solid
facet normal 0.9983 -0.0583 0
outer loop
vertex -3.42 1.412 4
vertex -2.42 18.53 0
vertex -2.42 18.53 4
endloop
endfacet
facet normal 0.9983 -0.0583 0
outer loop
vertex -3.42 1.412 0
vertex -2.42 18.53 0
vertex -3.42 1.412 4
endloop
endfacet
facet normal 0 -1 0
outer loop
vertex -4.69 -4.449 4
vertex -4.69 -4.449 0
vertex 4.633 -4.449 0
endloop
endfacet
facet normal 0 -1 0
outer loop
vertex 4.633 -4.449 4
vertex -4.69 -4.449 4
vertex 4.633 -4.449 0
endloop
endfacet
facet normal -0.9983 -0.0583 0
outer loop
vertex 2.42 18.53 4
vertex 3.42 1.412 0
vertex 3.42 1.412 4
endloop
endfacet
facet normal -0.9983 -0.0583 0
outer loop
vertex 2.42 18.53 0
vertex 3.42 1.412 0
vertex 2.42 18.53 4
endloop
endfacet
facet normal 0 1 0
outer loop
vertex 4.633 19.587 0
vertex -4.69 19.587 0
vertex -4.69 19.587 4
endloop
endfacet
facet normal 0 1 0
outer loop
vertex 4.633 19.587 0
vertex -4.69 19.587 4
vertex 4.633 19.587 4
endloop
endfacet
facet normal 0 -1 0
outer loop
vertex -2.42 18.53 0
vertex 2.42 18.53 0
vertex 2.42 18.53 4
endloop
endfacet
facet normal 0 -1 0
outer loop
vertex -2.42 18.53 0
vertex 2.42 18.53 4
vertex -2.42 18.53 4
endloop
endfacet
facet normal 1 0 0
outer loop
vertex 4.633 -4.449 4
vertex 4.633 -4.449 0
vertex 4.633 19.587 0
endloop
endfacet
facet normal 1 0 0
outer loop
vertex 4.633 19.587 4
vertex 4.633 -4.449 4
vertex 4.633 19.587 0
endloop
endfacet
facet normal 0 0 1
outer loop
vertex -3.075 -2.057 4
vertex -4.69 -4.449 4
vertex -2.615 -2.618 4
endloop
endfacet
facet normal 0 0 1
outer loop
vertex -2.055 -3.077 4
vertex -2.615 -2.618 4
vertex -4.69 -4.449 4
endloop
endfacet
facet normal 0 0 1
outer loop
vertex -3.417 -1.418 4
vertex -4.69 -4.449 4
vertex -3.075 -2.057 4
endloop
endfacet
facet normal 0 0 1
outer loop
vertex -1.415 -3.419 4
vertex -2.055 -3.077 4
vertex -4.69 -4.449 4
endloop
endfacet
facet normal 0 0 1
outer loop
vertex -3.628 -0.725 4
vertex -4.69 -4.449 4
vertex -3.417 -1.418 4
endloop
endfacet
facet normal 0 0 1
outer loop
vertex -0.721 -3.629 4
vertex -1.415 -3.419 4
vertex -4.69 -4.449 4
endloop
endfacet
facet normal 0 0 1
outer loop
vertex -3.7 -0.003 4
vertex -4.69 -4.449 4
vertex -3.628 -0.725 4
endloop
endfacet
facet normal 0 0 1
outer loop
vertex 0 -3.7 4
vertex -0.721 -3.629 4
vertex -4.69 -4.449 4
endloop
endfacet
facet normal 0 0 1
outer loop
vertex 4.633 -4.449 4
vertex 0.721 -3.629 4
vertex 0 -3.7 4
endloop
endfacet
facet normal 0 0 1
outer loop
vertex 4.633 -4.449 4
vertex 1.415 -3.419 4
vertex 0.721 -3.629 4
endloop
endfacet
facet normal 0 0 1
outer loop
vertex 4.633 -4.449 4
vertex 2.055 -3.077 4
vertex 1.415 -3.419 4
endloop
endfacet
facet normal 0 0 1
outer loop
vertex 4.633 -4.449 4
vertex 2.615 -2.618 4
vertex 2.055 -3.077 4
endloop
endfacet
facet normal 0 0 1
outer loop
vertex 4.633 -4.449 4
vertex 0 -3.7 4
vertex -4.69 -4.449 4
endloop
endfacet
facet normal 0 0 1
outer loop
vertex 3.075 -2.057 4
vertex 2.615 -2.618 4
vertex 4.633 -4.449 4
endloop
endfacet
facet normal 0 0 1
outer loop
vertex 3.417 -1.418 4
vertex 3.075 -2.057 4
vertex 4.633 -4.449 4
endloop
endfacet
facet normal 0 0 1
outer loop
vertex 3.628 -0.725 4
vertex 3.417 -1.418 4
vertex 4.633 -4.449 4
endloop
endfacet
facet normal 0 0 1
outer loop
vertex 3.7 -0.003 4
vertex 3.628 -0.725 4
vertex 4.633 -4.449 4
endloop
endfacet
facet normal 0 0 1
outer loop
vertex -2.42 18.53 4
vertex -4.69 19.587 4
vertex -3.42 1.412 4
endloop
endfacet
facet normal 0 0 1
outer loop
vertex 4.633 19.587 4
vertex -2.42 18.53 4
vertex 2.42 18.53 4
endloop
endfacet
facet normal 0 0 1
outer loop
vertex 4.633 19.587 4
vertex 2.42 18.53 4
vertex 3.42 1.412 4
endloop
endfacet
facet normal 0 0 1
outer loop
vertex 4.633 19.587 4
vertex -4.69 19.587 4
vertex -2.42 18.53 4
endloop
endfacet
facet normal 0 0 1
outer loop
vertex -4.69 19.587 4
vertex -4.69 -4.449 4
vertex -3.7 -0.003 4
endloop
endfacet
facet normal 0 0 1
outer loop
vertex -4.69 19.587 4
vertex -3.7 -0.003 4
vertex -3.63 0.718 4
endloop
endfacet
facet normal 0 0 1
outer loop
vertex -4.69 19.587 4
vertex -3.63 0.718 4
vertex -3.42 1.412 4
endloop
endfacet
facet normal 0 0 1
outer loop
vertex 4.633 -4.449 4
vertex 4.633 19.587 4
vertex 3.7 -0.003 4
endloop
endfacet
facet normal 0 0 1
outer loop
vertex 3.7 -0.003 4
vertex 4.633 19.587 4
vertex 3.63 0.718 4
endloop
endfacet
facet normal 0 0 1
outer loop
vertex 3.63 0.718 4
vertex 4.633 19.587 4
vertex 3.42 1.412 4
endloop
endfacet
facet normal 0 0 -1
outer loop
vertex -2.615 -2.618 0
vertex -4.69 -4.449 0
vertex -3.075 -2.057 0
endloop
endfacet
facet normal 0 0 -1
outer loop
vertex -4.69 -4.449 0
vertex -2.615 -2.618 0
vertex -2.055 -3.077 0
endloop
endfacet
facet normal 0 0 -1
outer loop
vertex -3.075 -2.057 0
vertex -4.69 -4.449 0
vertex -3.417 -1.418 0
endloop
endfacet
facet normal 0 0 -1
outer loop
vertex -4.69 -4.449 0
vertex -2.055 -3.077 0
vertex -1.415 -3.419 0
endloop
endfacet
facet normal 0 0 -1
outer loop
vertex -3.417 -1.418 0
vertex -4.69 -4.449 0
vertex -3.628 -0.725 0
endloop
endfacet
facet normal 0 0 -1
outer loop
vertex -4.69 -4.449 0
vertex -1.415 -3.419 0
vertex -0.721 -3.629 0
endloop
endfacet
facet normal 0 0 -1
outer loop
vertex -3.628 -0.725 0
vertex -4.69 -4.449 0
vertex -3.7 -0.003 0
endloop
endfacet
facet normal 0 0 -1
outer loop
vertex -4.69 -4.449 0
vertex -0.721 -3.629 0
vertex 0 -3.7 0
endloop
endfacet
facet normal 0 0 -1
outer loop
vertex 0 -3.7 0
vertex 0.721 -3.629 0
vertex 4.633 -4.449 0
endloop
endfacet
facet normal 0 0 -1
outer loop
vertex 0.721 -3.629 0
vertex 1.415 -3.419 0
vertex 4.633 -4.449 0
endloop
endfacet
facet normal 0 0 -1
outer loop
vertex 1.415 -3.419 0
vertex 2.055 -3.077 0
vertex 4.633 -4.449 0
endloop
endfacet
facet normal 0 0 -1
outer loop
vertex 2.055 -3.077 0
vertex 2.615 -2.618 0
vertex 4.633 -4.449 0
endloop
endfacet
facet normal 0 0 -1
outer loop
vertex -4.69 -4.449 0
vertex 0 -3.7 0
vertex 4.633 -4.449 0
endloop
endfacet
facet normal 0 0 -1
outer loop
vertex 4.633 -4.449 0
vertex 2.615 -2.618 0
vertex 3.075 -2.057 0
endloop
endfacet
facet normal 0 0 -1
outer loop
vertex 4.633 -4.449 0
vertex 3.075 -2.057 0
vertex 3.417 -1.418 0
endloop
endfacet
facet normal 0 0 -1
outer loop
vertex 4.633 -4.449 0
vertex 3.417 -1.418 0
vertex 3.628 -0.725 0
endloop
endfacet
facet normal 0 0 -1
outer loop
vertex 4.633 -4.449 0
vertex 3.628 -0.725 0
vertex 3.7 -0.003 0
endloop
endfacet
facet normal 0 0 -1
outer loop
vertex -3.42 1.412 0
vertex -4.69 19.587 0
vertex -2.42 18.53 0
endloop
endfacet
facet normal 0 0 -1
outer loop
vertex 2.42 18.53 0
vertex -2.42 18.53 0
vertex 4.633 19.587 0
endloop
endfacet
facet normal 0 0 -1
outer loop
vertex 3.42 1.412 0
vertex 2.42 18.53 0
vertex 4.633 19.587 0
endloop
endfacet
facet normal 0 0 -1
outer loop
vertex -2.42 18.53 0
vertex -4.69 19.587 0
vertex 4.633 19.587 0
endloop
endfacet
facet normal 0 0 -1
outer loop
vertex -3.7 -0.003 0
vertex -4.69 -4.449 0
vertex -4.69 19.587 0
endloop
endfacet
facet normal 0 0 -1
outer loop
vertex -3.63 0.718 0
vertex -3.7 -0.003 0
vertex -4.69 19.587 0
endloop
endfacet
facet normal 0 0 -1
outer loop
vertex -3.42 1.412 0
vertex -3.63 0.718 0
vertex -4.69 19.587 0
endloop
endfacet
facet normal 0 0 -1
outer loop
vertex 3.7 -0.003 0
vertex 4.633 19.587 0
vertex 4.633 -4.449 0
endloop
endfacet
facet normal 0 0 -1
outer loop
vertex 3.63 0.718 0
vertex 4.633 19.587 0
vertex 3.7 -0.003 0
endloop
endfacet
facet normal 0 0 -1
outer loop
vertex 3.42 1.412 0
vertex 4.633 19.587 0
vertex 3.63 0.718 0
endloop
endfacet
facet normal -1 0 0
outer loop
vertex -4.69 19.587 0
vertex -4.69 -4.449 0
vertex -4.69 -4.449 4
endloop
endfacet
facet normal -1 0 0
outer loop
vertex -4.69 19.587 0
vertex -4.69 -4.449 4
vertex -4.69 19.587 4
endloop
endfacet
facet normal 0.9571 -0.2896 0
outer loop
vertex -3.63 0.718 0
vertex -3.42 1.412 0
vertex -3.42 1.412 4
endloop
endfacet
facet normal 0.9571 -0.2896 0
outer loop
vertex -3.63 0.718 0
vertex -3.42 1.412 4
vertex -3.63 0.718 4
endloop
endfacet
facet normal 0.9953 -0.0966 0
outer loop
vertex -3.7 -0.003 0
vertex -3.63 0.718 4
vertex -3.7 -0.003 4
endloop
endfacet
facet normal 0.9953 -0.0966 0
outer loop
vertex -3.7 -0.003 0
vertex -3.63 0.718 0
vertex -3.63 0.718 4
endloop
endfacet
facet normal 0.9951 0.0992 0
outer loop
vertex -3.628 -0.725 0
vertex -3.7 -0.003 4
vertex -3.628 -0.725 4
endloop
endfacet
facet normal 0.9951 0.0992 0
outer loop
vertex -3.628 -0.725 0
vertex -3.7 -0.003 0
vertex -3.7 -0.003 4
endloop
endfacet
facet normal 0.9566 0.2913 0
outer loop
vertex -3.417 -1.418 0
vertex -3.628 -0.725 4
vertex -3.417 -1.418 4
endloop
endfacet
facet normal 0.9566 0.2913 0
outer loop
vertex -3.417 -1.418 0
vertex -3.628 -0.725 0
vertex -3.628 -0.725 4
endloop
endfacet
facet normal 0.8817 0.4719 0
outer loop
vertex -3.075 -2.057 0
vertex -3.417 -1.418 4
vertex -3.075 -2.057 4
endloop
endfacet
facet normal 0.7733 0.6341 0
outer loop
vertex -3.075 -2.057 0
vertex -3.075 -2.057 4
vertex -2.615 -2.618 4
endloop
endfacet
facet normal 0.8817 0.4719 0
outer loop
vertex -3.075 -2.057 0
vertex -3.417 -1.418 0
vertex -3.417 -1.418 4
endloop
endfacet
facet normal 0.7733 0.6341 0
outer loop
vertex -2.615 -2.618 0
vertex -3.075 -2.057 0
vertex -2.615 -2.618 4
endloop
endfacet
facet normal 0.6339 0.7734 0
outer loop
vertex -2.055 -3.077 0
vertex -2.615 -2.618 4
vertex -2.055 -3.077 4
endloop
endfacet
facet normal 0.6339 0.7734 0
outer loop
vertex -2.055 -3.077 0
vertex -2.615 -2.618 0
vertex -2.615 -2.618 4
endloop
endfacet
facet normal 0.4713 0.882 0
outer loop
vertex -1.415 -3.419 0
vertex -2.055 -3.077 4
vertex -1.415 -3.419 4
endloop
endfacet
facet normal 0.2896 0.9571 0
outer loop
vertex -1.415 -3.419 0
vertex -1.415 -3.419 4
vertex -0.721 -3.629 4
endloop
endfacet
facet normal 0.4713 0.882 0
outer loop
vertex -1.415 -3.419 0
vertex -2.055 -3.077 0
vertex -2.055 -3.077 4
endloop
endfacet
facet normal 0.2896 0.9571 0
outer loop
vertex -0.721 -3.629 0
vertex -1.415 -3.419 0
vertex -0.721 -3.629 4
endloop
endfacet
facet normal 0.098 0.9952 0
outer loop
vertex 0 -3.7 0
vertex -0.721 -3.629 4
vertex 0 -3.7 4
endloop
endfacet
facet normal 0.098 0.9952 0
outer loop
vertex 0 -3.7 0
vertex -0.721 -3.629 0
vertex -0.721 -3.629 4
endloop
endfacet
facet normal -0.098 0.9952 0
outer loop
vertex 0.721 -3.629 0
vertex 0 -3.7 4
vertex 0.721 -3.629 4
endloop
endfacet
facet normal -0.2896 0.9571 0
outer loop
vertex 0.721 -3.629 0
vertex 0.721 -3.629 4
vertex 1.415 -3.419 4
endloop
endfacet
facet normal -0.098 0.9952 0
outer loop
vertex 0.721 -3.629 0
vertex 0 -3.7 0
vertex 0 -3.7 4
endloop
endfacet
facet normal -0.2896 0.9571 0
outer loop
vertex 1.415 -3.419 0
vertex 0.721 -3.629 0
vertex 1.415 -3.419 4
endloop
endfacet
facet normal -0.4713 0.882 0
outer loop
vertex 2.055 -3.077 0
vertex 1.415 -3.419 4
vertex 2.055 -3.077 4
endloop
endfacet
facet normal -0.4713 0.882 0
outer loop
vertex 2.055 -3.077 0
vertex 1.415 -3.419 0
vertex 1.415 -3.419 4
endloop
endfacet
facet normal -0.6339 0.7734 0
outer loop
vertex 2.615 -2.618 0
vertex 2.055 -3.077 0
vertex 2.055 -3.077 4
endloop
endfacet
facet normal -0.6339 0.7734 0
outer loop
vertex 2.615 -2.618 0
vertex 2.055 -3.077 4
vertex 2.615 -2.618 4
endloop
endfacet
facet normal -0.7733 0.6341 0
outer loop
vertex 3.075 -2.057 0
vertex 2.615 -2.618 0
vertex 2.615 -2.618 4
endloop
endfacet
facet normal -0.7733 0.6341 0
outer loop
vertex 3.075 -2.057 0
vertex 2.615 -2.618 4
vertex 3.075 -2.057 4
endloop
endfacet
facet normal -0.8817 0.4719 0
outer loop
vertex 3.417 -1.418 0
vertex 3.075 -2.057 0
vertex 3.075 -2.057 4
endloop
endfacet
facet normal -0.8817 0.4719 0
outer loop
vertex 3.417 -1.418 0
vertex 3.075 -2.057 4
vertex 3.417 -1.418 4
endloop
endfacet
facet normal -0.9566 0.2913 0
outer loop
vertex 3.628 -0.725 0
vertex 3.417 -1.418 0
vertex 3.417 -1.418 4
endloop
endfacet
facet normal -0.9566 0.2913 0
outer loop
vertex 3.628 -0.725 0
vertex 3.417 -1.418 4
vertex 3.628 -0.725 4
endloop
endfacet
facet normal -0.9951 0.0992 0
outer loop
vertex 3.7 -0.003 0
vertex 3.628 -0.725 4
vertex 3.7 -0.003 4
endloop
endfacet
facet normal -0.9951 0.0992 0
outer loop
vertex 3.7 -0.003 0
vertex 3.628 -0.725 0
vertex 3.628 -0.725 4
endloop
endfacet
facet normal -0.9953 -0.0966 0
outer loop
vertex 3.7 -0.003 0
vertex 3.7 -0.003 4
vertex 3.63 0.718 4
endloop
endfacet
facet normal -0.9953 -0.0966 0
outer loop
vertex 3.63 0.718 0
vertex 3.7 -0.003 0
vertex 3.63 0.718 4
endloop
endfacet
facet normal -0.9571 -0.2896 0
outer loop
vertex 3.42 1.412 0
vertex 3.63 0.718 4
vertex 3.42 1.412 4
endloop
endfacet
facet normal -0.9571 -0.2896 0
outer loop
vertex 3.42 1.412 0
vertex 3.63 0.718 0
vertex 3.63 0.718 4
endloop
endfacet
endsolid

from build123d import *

# Parameters (mm, degrees)
SKETCH2_W           = 9.323493139
SKETCH2_H           = 24.035794238
BOSS_EXTRUDE1_DEPTH = 4


with BuildPart() as part:
    # Sketch2 → Boss-Extrude1 (new body)
    with BuildSketch(Plane.XY):
        with Locations((-0.028670292, 7.569333036)):
            Rectangle(SKETCH2_W, SKETCH2_H)
        with BuildLine():
            Line((2.42, 18.53), (-2.42, 18.53))
            Line((-2.42, 18.53), (-3.42, 1.411949008))
            ThreePointArc((-3.42, 1.411949008), (0, -3.7), (3.42, 1.411949008))
            Line((3.42, 1.411949008), (2.42, 18.53))
        make_face(mode=Mode.SUBTRACT)
    extrude(amount=BOSS_EXTRUDE1_DEPTH)


solid = part.part
